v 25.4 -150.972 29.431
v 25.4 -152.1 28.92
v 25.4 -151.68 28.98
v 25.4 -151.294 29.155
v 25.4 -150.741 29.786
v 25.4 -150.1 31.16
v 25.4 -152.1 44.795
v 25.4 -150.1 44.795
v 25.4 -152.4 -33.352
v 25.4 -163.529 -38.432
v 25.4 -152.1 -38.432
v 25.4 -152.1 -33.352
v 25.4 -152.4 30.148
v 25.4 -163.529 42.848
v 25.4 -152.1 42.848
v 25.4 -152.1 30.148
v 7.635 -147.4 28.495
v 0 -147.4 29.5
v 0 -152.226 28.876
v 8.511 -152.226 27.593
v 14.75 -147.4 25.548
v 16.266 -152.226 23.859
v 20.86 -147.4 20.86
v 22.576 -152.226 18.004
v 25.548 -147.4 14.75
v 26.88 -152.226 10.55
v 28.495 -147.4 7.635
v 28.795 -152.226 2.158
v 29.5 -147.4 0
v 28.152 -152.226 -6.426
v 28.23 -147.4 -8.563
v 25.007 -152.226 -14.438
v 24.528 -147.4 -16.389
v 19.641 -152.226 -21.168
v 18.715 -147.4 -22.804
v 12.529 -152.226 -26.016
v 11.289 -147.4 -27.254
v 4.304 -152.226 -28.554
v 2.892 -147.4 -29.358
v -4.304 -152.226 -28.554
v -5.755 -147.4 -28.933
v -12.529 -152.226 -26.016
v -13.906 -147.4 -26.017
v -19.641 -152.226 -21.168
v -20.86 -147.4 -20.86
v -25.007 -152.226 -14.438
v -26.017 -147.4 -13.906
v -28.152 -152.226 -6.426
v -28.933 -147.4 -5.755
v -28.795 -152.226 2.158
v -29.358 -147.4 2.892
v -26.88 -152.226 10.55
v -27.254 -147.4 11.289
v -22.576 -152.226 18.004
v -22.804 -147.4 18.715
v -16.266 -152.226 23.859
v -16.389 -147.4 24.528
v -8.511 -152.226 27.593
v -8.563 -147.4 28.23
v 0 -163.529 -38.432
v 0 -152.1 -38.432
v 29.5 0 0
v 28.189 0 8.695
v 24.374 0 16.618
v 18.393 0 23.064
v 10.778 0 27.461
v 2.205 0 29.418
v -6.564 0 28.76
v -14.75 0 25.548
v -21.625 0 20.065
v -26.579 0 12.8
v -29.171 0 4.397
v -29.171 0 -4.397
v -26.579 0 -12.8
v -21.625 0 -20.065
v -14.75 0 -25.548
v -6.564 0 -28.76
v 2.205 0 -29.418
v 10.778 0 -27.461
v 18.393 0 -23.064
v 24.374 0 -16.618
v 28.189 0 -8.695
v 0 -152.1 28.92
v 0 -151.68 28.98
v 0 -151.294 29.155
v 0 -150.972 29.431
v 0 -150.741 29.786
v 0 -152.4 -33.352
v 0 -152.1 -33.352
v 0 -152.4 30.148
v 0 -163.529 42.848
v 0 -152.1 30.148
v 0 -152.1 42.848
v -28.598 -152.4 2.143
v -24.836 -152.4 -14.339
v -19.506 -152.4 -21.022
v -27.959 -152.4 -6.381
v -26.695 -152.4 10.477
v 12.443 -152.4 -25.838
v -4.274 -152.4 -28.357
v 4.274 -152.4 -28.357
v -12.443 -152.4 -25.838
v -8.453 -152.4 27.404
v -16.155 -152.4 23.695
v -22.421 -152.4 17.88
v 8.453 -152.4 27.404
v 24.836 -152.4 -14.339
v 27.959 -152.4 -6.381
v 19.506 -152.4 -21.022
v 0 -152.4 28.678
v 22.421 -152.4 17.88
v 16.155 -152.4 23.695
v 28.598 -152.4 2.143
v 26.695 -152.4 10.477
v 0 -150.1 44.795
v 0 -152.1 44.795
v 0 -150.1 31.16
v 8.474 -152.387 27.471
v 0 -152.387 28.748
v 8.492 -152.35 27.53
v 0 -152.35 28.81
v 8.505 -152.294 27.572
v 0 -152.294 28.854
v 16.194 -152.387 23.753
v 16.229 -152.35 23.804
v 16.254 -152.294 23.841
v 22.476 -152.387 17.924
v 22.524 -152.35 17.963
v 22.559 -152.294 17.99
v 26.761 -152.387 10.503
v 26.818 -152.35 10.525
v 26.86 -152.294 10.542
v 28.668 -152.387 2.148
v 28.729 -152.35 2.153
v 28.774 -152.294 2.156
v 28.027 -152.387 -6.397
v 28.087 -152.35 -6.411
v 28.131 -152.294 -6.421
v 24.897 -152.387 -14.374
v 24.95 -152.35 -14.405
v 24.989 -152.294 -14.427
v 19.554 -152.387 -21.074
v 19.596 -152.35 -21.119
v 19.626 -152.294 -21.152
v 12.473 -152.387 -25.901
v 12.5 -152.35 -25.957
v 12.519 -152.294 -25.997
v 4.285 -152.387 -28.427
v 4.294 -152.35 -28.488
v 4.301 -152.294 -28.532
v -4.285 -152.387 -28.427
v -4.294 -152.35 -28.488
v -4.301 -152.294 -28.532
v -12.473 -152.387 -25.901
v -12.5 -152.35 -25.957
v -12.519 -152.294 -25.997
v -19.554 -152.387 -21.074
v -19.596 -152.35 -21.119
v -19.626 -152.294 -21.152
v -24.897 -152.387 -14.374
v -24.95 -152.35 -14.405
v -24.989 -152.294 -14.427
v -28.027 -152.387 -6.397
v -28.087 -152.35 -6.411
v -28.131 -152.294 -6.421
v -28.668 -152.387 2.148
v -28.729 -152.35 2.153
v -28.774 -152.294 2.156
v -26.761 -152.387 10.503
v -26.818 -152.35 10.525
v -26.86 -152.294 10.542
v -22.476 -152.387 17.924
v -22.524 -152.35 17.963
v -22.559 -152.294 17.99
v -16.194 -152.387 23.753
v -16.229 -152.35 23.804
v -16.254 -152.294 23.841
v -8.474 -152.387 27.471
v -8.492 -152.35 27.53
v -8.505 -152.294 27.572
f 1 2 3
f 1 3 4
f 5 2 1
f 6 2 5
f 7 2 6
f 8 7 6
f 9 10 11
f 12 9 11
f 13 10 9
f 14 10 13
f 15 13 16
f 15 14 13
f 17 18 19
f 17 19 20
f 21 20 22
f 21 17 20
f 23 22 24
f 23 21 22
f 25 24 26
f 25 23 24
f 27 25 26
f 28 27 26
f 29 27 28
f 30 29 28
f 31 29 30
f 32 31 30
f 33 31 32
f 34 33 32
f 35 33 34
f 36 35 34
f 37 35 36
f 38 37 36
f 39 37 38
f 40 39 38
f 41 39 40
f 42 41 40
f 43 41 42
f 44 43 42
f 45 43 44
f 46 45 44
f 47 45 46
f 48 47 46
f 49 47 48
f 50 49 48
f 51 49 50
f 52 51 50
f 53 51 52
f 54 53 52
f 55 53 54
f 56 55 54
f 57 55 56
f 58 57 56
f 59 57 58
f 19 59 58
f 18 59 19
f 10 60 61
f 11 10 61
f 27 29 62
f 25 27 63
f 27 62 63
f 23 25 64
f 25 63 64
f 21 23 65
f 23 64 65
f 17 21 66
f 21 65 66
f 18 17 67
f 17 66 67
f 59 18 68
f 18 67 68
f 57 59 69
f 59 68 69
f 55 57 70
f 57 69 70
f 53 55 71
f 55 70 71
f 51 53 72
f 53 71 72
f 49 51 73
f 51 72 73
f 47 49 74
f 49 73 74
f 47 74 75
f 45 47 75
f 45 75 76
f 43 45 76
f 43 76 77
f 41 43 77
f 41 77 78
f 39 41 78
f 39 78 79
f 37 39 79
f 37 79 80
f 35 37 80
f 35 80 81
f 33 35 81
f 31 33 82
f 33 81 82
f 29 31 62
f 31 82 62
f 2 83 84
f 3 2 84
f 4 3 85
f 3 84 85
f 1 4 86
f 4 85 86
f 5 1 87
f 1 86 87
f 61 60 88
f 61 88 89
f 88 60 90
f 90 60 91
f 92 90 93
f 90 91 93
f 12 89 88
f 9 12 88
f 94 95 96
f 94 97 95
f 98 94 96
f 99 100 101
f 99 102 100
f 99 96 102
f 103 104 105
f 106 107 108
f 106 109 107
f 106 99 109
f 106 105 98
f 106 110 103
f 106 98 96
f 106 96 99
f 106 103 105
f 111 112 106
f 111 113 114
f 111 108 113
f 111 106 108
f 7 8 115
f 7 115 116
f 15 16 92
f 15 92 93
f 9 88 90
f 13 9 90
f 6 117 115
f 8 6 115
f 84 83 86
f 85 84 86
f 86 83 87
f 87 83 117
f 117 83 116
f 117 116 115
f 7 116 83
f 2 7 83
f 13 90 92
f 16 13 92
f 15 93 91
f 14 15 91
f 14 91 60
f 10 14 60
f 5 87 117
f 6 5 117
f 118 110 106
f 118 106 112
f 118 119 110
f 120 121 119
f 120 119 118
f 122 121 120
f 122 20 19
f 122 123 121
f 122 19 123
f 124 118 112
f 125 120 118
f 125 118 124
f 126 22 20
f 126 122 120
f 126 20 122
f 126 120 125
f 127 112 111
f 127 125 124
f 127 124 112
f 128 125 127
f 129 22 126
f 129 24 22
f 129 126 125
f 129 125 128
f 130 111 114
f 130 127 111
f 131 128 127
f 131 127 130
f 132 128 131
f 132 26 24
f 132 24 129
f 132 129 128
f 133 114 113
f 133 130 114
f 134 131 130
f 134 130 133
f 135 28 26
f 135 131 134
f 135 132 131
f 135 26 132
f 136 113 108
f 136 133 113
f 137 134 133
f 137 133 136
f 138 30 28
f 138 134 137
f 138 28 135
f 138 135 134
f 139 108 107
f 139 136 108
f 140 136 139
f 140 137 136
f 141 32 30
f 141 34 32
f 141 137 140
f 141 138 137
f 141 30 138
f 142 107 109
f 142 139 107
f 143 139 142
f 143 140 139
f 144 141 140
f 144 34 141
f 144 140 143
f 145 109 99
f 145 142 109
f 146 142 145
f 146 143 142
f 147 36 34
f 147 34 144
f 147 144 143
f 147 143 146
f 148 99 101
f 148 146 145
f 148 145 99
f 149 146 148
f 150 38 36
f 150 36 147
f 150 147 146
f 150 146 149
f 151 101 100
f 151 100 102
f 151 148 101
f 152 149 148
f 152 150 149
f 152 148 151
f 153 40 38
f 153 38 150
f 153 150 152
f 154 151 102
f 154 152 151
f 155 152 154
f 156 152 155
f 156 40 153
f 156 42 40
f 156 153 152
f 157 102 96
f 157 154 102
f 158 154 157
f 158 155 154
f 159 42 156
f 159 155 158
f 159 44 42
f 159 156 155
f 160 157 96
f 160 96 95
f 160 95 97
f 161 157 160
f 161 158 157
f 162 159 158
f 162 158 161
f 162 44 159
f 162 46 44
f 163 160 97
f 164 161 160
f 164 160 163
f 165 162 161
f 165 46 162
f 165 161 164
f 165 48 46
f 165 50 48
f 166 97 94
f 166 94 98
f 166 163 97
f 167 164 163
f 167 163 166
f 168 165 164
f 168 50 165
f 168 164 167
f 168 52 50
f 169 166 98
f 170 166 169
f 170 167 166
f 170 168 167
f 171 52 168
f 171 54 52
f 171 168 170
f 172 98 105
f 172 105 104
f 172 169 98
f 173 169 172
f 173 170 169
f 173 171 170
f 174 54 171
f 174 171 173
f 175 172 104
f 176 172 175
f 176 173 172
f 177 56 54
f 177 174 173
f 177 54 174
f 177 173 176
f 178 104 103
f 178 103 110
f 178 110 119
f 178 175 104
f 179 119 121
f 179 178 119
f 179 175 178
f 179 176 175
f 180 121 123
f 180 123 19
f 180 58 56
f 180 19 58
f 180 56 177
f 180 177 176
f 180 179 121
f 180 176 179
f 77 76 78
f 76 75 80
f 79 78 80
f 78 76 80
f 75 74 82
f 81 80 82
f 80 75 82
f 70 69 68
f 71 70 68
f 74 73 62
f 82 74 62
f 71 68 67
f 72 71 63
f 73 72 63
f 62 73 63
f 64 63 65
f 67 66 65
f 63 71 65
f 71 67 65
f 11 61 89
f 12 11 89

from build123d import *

# Parameters (mm, degrees)
F0_R     = 29.5
F1_DEPTH = 152.4
F5_DEPTH = 25.4
F7_DEPTH = 25.4


with BuildPart() as f1:
    # F0 (on Front) → F1 (new body)
    with BuildSketch(Plane.XZ):
        Circle(F0_R)
    extrude(amount=F1_DEPTH)

    # F2 (on Right) → F3 (revolve, cut)
    with BuildSketch(Plane.YZ):
        with BuildLine():
            Line((-147.4, 29.5), (-152.4, 29.5))
            Line((-152.4, 29.5), (-152.4, 28.67772))
            ThreePointArc((-152.4, 28.67772), (-152.350215, 28.809764), (-152.225645, 28.876069))
            Line((-152.225645, 28.876069), (-147.4, 29.5))
        make_face()
    revolve(axis=Axis((0, -70.144305, 0), (0, 1, 0)), mode=Mode.SUBTRACT)


with BuildPart() as f5:
    # F4 (on Right) → F5 (new body)
    with BuildSketch(Plane.YZ):
        Polygon((-152.1, 42.847586), (-163.528681, 42.847586), (-163.528681, -38.432414), (-152.1, -38.432414), (-152.1, -33.352414), (-152.4, -33.352414), (-152.4, 30.147586), (-152.1, 30.147586), align=None)
    extrude(amount=F5_DEPTH)


with BuildPart() as f7:
    # F6 (on Right) → F7 (new body)
    with BuildSketch(Plane.YZ):
        with BuildLine():
            Line((-152.1, 44.794827), (-152.1, 28.919827))
            ThreePointArc((-152.1, 28.919827), (-151.294051, 29.15474), (-150.740538, 29.7859))
            Line((-150.740538, 29.7859), (-150.1, 31.159539))
            Line((-150.1, 31.159539), (-150.1, 44.794827))
            Line((-150.1, 44.794827), (-152.1, 44.794827))
        make_face()
    extrude(amount=F7_DEPTH)


solid = Compound([f1.part, f5.part, f7.part])
